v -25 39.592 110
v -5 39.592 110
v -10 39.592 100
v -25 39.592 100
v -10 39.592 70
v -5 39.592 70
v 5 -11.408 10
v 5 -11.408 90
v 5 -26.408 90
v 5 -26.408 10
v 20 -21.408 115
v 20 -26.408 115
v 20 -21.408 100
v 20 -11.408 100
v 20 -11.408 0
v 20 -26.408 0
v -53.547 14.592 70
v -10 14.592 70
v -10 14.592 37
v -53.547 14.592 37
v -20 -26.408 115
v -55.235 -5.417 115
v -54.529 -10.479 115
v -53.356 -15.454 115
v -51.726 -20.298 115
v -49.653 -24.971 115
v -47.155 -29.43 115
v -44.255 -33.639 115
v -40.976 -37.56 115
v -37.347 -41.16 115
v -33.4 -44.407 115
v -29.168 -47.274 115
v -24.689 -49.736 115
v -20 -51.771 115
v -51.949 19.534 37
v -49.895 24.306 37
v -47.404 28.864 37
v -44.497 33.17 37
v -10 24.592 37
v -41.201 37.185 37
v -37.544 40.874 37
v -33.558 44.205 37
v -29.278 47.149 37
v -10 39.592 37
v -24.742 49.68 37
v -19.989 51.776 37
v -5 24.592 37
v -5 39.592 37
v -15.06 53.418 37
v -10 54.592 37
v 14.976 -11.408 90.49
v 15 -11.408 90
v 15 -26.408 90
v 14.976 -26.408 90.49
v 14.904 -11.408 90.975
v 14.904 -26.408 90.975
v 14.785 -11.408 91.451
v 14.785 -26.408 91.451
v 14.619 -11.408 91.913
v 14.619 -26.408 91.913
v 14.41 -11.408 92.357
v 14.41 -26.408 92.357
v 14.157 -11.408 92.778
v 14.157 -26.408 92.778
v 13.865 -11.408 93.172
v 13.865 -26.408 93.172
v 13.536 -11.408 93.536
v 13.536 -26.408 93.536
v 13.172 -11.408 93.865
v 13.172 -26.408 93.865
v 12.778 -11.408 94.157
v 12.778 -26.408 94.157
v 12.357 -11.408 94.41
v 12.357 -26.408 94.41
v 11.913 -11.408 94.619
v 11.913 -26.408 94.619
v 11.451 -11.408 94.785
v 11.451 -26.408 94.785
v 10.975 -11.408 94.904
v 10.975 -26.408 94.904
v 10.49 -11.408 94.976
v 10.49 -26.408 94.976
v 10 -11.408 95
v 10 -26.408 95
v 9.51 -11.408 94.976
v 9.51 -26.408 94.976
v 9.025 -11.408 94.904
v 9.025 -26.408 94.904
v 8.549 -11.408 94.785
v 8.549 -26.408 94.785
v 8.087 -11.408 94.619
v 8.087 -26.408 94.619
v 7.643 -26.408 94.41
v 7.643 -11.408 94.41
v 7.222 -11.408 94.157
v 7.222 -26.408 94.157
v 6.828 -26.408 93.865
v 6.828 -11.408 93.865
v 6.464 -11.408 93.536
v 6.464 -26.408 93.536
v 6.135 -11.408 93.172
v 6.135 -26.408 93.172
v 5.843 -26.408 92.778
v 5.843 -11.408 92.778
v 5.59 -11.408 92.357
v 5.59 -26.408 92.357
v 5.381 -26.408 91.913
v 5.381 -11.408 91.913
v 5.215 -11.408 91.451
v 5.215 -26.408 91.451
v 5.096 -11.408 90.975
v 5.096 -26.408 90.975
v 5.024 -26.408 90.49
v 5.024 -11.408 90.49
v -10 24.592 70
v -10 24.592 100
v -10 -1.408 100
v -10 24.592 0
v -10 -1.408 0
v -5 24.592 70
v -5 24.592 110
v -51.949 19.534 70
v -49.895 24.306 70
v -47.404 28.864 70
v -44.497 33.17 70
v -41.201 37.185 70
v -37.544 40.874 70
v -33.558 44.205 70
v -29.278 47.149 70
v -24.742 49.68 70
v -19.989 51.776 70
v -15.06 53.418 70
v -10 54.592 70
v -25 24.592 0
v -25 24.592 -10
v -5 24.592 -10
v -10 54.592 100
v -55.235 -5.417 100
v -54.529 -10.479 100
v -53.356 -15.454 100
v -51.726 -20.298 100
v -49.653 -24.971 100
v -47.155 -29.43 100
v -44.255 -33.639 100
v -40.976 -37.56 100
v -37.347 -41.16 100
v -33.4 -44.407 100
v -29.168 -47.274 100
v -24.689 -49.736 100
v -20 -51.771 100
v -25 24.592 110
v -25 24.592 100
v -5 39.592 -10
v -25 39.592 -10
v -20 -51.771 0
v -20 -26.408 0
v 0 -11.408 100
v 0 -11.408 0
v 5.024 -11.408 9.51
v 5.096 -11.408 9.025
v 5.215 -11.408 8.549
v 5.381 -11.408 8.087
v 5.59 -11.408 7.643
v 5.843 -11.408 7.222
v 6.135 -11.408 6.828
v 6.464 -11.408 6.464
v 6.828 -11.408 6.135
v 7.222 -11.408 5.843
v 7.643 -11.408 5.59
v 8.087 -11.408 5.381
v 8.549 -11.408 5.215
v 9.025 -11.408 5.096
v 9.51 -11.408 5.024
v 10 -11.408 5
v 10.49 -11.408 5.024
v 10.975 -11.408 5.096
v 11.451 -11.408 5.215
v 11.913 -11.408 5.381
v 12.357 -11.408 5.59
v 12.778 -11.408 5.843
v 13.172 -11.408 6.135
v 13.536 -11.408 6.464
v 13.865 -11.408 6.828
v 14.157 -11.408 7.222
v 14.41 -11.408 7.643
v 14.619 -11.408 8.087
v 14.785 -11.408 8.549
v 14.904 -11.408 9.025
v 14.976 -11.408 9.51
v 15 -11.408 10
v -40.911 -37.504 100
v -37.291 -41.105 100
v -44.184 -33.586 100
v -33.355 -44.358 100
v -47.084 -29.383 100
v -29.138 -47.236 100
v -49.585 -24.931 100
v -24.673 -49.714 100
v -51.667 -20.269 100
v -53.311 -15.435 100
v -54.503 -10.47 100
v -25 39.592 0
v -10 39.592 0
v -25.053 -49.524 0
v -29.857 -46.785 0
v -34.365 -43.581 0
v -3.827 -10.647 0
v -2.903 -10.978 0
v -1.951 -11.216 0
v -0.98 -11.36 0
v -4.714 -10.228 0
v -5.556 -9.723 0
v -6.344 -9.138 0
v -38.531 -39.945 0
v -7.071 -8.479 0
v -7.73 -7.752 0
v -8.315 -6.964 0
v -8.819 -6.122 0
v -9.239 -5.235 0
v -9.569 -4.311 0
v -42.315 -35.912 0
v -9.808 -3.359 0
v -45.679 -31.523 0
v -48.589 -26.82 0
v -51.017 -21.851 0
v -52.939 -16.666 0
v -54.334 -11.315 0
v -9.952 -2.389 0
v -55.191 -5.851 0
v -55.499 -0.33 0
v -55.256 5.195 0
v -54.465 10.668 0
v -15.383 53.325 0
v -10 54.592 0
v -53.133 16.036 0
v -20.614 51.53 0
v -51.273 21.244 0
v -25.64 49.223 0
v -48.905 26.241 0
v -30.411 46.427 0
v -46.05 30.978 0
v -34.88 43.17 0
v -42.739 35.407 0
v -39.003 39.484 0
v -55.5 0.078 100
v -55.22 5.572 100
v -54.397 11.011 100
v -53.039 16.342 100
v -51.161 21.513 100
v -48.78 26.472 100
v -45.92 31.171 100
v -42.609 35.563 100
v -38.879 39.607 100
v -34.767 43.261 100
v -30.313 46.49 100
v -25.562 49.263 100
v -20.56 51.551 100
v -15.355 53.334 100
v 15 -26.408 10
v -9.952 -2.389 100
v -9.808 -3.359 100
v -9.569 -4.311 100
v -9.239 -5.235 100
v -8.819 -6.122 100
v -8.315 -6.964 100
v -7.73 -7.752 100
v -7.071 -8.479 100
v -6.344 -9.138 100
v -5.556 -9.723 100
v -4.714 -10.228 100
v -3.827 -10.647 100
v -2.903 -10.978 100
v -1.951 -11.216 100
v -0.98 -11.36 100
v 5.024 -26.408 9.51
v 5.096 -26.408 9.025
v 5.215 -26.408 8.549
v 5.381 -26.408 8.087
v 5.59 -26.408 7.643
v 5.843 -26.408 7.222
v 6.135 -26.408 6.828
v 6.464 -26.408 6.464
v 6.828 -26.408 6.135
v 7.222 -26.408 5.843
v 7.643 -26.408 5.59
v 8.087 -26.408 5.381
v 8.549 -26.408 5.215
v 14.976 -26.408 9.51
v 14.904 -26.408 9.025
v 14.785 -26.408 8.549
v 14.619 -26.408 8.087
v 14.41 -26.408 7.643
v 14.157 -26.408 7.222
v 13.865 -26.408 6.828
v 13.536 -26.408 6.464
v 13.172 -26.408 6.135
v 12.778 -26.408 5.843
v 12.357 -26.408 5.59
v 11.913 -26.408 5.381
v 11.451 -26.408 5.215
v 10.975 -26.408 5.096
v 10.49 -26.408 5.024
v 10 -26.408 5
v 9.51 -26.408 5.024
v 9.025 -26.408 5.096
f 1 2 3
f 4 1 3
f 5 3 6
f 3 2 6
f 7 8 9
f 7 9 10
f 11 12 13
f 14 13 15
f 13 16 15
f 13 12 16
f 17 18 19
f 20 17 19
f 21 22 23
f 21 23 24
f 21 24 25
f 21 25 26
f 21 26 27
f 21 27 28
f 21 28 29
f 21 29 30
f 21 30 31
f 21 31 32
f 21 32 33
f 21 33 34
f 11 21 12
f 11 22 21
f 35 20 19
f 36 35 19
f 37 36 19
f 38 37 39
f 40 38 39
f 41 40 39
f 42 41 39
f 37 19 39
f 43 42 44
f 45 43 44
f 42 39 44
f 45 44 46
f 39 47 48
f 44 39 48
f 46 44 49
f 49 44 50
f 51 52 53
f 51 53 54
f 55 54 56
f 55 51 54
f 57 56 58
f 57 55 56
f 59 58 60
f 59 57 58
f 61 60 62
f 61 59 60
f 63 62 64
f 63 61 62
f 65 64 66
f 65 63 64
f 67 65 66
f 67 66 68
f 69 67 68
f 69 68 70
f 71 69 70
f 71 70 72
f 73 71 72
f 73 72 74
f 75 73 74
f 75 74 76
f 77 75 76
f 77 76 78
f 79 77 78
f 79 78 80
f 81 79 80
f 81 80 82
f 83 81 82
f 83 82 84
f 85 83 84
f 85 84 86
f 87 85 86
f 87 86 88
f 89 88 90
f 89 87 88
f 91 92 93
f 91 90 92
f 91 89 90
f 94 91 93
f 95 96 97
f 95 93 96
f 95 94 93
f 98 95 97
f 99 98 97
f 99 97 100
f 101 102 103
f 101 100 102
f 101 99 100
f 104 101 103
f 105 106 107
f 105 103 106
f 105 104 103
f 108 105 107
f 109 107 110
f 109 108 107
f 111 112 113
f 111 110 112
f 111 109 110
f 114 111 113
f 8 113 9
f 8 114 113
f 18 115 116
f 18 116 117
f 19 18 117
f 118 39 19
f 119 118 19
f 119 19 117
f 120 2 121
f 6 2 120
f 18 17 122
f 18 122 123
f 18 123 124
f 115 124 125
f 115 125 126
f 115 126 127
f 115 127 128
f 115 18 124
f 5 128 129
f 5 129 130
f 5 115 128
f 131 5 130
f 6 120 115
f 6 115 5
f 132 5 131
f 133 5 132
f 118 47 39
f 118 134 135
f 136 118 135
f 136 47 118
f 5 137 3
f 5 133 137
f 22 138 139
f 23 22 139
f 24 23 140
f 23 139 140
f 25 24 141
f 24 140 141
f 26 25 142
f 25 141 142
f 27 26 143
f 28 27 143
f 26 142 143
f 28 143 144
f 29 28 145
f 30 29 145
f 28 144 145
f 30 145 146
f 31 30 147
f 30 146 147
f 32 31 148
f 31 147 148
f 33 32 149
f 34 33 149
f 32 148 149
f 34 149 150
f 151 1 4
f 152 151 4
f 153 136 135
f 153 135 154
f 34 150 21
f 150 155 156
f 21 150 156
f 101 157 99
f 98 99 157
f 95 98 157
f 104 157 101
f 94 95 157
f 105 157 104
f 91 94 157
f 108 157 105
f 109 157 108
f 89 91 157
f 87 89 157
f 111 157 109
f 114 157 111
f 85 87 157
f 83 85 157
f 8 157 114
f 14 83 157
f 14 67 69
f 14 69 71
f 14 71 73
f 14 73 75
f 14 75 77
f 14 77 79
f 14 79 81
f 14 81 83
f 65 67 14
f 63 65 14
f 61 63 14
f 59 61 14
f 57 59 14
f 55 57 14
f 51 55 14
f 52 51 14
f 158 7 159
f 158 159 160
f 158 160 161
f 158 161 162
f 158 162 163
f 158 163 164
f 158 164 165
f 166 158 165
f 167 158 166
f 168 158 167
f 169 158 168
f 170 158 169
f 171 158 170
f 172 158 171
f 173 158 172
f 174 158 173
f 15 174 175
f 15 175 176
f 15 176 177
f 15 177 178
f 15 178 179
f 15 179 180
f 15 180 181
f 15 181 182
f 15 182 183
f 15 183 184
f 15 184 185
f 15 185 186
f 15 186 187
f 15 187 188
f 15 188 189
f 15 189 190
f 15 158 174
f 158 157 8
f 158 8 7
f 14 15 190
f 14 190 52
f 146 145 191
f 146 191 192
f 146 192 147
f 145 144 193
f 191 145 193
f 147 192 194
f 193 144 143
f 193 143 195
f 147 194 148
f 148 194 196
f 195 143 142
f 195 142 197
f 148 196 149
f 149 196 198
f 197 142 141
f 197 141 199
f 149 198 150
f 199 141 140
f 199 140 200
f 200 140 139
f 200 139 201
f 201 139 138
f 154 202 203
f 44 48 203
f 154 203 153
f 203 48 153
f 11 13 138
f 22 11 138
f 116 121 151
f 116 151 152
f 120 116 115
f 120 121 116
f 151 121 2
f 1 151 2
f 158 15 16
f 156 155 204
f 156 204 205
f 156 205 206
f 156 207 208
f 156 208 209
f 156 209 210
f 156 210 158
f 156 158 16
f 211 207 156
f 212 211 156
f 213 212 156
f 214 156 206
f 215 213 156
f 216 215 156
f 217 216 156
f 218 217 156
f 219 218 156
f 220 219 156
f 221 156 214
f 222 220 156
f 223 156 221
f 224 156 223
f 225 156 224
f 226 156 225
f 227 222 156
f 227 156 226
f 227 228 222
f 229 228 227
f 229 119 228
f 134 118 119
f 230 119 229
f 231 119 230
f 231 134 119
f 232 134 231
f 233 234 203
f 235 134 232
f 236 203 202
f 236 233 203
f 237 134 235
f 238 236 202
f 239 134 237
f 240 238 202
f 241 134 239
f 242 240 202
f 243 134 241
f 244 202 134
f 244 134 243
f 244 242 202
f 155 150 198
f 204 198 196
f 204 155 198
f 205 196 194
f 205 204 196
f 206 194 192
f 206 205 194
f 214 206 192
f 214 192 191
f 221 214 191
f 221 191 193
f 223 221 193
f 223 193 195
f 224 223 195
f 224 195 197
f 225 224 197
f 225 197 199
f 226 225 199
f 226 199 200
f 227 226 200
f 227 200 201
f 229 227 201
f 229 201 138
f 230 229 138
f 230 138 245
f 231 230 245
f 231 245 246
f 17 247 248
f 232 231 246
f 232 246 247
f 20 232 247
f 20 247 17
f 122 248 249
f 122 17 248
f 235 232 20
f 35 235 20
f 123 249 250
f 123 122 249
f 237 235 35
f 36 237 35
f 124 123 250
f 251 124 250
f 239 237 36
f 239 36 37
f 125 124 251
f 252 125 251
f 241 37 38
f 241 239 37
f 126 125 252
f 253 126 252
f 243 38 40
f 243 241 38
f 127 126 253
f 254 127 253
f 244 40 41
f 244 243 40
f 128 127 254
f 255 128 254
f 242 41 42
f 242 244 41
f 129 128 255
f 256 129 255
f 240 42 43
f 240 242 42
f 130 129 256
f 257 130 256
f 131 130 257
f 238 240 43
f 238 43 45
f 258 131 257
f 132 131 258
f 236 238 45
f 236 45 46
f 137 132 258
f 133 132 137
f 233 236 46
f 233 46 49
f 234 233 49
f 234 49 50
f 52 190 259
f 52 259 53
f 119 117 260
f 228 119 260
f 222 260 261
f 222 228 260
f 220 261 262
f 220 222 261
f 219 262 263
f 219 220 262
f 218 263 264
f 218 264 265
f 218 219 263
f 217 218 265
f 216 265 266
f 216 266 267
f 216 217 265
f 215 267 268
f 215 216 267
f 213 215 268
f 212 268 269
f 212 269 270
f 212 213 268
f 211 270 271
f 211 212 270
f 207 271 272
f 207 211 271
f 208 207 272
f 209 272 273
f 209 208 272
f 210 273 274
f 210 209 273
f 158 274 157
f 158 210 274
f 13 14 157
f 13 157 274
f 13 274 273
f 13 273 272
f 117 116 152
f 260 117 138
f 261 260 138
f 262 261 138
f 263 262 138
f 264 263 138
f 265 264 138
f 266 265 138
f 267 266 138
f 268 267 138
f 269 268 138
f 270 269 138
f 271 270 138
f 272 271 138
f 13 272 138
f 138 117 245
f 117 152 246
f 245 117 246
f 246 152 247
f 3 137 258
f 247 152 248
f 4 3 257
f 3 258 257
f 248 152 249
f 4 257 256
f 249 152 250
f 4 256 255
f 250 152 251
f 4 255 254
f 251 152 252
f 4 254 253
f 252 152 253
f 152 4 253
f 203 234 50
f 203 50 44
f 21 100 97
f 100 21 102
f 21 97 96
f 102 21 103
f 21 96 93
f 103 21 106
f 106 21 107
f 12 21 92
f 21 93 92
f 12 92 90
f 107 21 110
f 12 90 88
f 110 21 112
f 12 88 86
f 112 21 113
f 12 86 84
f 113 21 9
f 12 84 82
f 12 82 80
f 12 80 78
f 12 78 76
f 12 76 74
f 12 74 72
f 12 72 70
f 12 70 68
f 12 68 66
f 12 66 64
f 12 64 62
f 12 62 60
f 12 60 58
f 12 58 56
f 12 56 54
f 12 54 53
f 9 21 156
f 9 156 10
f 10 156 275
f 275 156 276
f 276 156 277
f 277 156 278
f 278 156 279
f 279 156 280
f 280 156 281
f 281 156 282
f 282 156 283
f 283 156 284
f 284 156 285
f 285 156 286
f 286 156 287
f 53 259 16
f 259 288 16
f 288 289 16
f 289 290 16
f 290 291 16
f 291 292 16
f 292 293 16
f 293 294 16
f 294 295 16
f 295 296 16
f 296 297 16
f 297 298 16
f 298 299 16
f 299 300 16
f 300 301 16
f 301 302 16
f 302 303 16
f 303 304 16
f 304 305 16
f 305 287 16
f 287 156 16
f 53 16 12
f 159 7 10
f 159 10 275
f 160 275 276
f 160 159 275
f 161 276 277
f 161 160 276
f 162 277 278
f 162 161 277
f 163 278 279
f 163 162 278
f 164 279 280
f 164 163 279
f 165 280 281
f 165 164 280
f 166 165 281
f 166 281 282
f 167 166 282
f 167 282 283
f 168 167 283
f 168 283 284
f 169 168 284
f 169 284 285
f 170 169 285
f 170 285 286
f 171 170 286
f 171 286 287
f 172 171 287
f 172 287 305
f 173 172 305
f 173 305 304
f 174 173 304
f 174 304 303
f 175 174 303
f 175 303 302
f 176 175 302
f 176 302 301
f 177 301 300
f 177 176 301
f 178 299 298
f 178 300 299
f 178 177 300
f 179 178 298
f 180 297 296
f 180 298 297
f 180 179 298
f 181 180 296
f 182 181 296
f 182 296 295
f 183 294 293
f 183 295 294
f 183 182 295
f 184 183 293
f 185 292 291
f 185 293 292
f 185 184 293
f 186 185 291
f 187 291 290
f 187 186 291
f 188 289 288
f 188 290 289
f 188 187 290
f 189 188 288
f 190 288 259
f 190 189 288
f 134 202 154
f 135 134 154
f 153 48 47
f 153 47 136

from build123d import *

# Parameters (mm, degrees)
BOSS_EXTRUDE1_DEPTH     = 100
CUT_EXTRUDE1_REACH      = 124.68
CUT_EXTRUDE1_END_RADIUS = 55.5
SKETCH4_W               = 33
SKETCH4_H               = 40
SKETCH5_W               = 40
SKETCH5_H               = 15
BOSS_EXTRUDE2_DEPTH     = 15
SKETCH6_W               = 40
SKETCH6_H               = 15
CUT_EXTRUDE2_DEPTH      = 10
SKETCH7_W               = 47
SKETCH7_H               = 15
BOSS_EXTRUDE3_DEPTH     = 5
SKETCH8_W               = 47
SKETCH8_H               = 15
BOSS_EXTRUDE4_DEPTH     = 20
CUT_EXTRUDE3_DEPTH      = 140.772135993
BOSS_EXTRUDE5_DEPTH     = 15


with BuildPart() as part:
    # Sketch1 → Boss-Extrude1 (new body)
    with BuildSketch(Plane.XY):
        with BuildLine():
            Line((-10, 54.591666031), (-10, -1.408333969))
            ThreePointArc((-10, -1.408333969), (-7.071067812, -8.479401781), (0, -11.408333969))
            Line((0, -11.408333969), (20, -11.408333969))
            Line((20, -11.408333969), (20, -26.408333969))
            Line((20, -26.408333969), (-20, -26.408333969))
            Line((-20, -26.408333969), (-20, -51.771130952))
            ThreePointArc((-20, -51.771130952), (-55.256322222, 5.195079839), (-10, 54.591666031))
        make_face()
    extrude(amount=BOSS_EXTRUDE1_DEPTH)

    # Cut-Extrude1: up to this cylinder (the profile starts inside it)
    cut_extrude1_end = Plane(origin=(0, 0, 53.5), z_dir=(0, 0, -1)) * Cylinder(CUT_EXTRUDE1_END_RADIUS, 361.36, mode=Mode.PRIVATE)
    # Sketch4 → Cut-Extrude1 (cut, up to the surface)
    with BuildSketch(Plane(origin=(-10, 0, 0), x_dir=(0, 0, -1), z_dir=(1, 0, 0)), mode=Mode.PRIVATE) as cut_extrude1_sk1:
        with Locations((-53.5, 34.591666031)):
            Rectangle(SKETCH4_W, SKETCH4_H)
    cut_extrude1_tool1 = extrude(cut_extrude1_sk1.sketch, amount=-CUT_EXTRUDE1_REACH, mode=Mode.PRIVATE) & cut_extrude1_end
    add(cut_extrude1_tool1.solids().sort_by_distance((-10, 34.591666, 53.5))[0], mode=Mode.SUBTRACT)

    # Sketch5 → Boss-Extrude2 (add, symmetric)
    with BuildSketch(Plane(origin=(-10, 0, 0), x_dir=(0, 0, -1), z_dir=(1, 0, 0))):
        with Locations((-90, 32.091666031)):
            Rectangle(SKETCH5_W, SKETCH5_H)
    extrude(amount=BOSS_EXTRUDE2_DEPTH, both=True)

    # Sketch6 → Cut-Extrude2 (cut)
    with BuildSketch(Plane(origin=(5, 0, 0), x_dir=(0, 0, -1), z_dir=(1, 0, 0))):
        with Locations((-90, 32.091666031)):
            Rectangle(SKETCH6_W, SKETCH6_H)
    extrude(amount=-CUT_EXTRUDE2_DEPTH, mode=Mode.SUBTRACT)

    # Sketch7 → Boss-Extrude3 (add, symmetric)
    with BuildSketch(Plane(origin=(-10, 0, 0), x_dir=(0, 0, -1), z_dir=(1, 0, 0))):
        with Locations((-13.5, 32.091666031)):
            Rectangle(SKETCH7_W, SKETCH7_H)
    extrude(amount=BOSS_EXTRUDE3_DEPTH, both=True)

    # Sketch8 → Boss-Extrude4 (add)
    with BuildSketch(Plane(origin=(-5, 0, 0), x_dir=(0, 0, -1), z_dir=(1, 0, 0))):
        with Locations((-13.5, 32.091666031)):
            Rectangle(SKETCH8_W, SKETCH8_H)
    extrude(amount=-BOSS_EXTRUDE4_DEPTH)

    # Sketch9 → Cut-Extrude3 (cut, through all)
    with BuildSketch(Plane(origin=(0, -11.408333969, 0), x_dir=(1, 0, 0), z_dir=(0, 1, 0))):
        with BuildLine():
            Line((15, -10), (15, -90))
            ThreePointArc((15, -90), (10, -95), (5, -90))
            Line((5, -90), (5, -10))
            ThreePointArc((5, -10), (10, -5), (15, -10))
        make_face()
    extrude(amount=-CUT_EXTRUDE3_DEPTH, mode=Mode.SUBTRACT)

    # Sketch10 → Boss-Extrude5 (add)
    with BuildSketch(Plane.XY.offset(100)):
        with BuildLine():
            Line((20, -26.408333969), (20, -21.408333969))
            Line((20, -21.408333969), (-55.235044142, -5.416631669))
            ThreePointArc((-55.235044142, -5.416631669), (-44.254717417, -33.638955135), (-20, -51.771130952))
            Line((-20, -51.771130952), (-20, -26.408333969))
            Line((-20, -26.408333969), (20, -26.408333969))
        make_face()
    extrude(amount=BOSS_EXTRUDE5_DEPTH)


solid = part.part
